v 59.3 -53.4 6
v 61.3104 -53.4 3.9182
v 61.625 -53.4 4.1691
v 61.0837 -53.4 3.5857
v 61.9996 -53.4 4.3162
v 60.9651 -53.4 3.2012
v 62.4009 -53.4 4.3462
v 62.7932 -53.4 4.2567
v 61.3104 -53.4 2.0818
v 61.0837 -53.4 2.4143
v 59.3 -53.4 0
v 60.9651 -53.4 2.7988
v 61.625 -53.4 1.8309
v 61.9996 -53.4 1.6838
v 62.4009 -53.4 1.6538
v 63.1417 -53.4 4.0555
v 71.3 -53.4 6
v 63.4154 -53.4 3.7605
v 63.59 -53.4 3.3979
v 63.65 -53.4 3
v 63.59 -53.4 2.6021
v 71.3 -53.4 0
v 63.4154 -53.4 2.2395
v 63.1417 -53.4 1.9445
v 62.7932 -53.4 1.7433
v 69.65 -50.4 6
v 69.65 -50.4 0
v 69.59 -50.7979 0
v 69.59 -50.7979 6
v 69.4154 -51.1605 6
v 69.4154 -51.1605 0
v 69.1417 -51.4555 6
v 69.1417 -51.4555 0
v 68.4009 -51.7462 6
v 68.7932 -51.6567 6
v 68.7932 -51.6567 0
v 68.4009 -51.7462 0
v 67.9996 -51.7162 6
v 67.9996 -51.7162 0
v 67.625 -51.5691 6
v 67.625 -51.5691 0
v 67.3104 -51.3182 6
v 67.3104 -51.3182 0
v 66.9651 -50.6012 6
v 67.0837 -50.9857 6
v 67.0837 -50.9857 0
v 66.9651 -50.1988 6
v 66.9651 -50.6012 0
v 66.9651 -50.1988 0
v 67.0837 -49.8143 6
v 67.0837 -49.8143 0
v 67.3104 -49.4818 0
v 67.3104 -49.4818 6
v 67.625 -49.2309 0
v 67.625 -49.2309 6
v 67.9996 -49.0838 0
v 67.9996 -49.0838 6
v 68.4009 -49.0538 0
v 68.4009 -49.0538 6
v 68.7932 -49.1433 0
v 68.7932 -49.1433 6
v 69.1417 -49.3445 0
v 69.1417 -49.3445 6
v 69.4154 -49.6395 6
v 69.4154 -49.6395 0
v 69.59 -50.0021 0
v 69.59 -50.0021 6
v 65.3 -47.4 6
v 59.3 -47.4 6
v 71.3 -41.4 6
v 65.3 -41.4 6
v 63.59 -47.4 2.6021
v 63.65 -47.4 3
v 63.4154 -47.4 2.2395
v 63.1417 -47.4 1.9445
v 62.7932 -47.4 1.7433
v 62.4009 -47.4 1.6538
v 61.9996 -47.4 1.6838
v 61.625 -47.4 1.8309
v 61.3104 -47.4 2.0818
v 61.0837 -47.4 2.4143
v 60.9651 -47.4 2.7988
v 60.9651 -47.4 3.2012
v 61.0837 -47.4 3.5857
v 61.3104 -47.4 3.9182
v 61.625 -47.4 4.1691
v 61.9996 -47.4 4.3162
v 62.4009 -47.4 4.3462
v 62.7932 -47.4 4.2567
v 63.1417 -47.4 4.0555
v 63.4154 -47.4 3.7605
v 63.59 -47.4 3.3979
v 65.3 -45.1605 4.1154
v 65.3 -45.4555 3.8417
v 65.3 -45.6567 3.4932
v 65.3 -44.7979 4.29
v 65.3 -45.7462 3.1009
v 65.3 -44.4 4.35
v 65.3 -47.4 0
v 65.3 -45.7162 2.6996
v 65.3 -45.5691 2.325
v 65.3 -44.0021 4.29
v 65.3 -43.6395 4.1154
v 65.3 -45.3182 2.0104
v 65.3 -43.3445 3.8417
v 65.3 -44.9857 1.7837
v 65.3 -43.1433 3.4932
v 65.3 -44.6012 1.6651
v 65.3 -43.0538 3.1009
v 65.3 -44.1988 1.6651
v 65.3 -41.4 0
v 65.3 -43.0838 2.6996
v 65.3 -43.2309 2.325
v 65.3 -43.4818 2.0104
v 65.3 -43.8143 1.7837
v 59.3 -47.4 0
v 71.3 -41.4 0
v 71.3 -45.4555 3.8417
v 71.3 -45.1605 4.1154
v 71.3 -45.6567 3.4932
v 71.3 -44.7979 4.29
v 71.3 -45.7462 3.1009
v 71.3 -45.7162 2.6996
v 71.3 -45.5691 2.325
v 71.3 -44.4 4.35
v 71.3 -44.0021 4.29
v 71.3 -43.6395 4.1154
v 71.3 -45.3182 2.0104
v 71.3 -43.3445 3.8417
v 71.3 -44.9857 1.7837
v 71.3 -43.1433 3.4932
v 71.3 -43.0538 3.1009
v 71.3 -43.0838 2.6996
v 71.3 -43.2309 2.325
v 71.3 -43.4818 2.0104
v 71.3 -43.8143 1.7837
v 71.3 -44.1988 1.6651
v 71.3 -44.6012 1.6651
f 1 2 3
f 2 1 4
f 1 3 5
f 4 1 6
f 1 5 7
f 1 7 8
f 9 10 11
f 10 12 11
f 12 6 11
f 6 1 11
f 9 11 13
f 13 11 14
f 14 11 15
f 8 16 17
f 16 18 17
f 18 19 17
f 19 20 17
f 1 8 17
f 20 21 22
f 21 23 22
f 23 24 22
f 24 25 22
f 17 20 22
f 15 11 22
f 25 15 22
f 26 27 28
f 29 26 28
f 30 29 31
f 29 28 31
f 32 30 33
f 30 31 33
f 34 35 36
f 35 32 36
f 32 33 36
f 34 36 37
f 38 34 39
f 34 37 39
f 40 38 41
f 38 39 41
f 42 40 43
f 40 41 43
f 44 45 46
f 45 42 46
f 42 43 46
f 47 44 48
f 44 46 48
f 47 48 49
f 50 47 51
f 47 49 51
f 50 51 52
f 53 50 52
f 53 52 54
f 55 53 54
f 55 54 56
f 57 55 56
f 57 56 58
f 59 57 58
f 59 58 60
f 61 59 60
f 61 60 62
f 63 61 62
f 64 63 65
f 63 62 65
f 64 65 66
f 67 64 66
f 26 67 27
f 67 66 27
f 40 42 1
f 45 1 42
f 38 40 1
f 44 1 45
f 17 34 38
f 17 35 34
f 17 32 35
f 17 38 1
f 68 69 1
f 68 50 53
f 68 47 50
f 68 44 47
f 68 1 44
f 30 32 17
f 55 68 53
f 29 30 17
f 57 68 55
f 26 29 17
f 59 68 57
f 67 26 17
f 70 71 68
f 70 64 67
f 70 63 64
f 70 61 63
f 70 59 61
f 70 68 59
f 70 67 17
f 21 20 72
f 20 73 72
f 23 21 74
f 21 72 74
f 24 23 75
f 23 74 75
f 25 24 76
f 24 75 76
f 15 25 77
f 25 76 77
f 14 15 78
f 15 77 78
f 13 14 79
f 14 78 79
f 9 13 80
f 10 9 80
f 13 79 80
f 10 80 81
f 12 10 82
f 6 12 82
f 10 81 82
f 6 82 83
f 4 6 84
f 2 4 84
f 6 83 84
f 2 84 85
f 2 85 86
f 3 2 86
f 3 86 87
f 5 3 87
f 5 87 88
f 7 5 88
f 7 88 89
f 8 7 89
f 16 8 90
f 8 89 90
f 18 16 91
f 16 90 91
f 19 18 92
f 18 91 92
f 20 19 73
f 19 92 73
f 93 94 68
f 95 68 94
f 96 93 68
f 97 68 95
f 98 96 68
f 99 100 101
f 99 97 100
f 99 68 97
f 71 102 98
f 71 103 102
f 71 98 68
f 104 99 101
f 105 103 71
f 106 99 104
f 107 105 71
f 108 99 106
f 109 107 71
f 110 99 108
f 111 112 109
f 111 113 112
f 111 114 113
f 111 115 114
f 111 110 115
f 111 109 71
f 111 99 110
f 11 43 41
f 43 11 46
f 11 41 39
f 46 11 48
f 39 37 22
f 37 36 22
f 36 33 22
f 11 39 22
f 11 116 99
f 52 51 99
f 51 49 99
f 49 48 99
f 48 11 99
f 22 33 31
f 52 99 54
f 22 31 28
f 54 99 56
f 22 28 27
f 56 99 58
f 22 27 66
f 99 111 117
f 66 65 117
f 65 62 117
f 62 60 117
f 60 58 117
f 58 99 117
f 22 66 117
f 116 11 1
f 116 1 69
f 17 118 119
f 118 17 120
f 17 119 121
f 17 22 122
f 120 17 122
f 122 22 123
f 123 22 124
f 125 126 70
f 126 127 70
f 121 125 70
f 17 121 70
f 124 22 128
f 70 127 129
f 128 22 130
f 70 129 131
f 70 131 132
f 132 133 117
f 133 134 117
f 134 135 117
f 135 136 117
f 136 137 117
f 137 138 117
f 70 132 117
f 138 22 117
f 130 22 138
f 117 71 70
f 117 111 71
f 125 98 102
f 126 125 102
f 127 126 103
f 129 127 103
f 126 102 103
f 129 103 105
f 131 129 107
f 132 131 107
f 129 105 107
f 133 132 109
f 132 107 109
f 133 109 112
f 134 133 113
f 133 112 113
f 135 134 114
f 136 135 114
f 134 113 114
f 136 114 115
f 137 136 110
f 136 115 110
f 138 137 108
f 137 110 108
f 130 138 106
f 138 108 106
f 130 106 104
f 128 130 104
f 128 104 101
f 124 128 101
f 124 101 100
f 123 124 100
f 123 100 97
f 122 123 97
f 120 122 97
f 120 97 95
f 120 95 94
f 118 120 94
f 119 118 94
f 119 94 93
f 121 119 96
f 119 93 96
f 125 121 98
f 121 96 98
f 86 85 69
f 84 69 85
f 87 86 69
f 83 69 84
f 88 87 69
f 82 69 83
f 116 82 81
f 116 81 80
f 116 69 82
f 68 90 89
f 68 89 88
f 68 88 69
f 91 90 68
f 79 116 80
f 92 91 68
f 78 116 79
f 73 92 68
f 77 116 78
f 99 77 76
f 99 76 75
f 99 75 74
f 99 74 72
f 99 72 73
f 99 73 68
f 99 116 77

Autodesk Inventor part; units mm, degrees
ref_plane "YZ Plane" through (0, 0, 0) normal (1, 0, 0) x (0, 1, 0)
ref_plane "XZ Plane" through (0, 0, 0) normal (0, 1, 0) x (-1, 0, 0)
ref_plane "XY Plane" through (0, 0, 0) normal (0, 0, 1) x (1, 0, 0)
sketch "스케치1" plane through (0, 0, 0) normal (0, 0, 1) x (1, 0, 0)
  line L0 (-71.3, 53.4) -> (-71.3, -53.4) projected
  line L1 (-71.3, -53.4) -> (71.3, -53.4) projected
  line L2 (71.3, -53.4) -> (71.3, 53.4) projected
  line L3 (71.3, 53.4) -> (-71.3, 53.4) projected
  line L4 (71.3, -53.4) -> (59.3, -53.4)
  line L5 (59.3, -53.4) -> (59.3, -47.4)
  line L6 (59.3, -47.4) -> (71.3, -47.4)
  line L7 (71.3, -47.4) -> (71.3, -53.4)
  line L8 (71.3, -53.4) -> (65.3, -53.4)
  line L9 (65.3, -53.4) -> (65.3, -41.4)
  line L10 (65.3, -41.4) -> (71.3, -41.4)
  line L11 (71.3, -41.4) -> (71.3, -53.4)
  circle A0 centre (68.3, -50.4) radius 1.35
  circle A1 centre (68.3, 50.4) radius 1.35 projected
  circle A2 centre (-68.3, 50.4) radius 1.35 projected
  circle A3 centre (-68.3, -50.4) radius 1.35 projected
  circle A4 centre (68.3, -50.4) radius 1.35 projected
  point P0 (0, 0)
  point P1 (65.3, -47.4)
  dimension "d0" = 12
  dimension "d1" = 6
  dimension "d2" = 6
  dimension "d3" = 12
  dimension "d12" = 2.7
extrude "돌출1" add sketch "스케치1" along normal blind 6 contours L5 L6 L9 L1 | L2 L6 L9 L10 | L9 L6 L2 L1
sketch "스케치2" plane through (59.3, -47.4, 0) normal (0, 1, 0) x (1, 0, 0)
  line L0 (0, 0) -> (0, -6) projected
  line L1 (0, -3) -> (6, -3)
  line L2 (6, 0) -> (6, -6) projected
  circle A0 centre (3, -3) radius 1.35
  point P0 (-59.3, 0)
  dimension "d6" = 2.7
extrude "돌출2" cut sketch "스케치2" against normal up to next
sketch "스케치3" plane through (65.3, -47.4, 0) normal (-1, 0, 0) x (0, 0, 1)
  line L0 (0, 6) -> (0, 0) projected
  line L1 (0, 0) -> (6, 0) projected
  line L2 (6, 6) -> (6, 0) projected
  line L3 (0, 6) -> (6, 6) projected
  circle A0 centre (3, 3) radius 1.35
  point P0 (0, 47.4)
  dimension "d9" = 2.7
extrude "돌출3" cut sketch "스케치3" against normal up to next contours A0
properties part number "chest_box_cap_connect"
